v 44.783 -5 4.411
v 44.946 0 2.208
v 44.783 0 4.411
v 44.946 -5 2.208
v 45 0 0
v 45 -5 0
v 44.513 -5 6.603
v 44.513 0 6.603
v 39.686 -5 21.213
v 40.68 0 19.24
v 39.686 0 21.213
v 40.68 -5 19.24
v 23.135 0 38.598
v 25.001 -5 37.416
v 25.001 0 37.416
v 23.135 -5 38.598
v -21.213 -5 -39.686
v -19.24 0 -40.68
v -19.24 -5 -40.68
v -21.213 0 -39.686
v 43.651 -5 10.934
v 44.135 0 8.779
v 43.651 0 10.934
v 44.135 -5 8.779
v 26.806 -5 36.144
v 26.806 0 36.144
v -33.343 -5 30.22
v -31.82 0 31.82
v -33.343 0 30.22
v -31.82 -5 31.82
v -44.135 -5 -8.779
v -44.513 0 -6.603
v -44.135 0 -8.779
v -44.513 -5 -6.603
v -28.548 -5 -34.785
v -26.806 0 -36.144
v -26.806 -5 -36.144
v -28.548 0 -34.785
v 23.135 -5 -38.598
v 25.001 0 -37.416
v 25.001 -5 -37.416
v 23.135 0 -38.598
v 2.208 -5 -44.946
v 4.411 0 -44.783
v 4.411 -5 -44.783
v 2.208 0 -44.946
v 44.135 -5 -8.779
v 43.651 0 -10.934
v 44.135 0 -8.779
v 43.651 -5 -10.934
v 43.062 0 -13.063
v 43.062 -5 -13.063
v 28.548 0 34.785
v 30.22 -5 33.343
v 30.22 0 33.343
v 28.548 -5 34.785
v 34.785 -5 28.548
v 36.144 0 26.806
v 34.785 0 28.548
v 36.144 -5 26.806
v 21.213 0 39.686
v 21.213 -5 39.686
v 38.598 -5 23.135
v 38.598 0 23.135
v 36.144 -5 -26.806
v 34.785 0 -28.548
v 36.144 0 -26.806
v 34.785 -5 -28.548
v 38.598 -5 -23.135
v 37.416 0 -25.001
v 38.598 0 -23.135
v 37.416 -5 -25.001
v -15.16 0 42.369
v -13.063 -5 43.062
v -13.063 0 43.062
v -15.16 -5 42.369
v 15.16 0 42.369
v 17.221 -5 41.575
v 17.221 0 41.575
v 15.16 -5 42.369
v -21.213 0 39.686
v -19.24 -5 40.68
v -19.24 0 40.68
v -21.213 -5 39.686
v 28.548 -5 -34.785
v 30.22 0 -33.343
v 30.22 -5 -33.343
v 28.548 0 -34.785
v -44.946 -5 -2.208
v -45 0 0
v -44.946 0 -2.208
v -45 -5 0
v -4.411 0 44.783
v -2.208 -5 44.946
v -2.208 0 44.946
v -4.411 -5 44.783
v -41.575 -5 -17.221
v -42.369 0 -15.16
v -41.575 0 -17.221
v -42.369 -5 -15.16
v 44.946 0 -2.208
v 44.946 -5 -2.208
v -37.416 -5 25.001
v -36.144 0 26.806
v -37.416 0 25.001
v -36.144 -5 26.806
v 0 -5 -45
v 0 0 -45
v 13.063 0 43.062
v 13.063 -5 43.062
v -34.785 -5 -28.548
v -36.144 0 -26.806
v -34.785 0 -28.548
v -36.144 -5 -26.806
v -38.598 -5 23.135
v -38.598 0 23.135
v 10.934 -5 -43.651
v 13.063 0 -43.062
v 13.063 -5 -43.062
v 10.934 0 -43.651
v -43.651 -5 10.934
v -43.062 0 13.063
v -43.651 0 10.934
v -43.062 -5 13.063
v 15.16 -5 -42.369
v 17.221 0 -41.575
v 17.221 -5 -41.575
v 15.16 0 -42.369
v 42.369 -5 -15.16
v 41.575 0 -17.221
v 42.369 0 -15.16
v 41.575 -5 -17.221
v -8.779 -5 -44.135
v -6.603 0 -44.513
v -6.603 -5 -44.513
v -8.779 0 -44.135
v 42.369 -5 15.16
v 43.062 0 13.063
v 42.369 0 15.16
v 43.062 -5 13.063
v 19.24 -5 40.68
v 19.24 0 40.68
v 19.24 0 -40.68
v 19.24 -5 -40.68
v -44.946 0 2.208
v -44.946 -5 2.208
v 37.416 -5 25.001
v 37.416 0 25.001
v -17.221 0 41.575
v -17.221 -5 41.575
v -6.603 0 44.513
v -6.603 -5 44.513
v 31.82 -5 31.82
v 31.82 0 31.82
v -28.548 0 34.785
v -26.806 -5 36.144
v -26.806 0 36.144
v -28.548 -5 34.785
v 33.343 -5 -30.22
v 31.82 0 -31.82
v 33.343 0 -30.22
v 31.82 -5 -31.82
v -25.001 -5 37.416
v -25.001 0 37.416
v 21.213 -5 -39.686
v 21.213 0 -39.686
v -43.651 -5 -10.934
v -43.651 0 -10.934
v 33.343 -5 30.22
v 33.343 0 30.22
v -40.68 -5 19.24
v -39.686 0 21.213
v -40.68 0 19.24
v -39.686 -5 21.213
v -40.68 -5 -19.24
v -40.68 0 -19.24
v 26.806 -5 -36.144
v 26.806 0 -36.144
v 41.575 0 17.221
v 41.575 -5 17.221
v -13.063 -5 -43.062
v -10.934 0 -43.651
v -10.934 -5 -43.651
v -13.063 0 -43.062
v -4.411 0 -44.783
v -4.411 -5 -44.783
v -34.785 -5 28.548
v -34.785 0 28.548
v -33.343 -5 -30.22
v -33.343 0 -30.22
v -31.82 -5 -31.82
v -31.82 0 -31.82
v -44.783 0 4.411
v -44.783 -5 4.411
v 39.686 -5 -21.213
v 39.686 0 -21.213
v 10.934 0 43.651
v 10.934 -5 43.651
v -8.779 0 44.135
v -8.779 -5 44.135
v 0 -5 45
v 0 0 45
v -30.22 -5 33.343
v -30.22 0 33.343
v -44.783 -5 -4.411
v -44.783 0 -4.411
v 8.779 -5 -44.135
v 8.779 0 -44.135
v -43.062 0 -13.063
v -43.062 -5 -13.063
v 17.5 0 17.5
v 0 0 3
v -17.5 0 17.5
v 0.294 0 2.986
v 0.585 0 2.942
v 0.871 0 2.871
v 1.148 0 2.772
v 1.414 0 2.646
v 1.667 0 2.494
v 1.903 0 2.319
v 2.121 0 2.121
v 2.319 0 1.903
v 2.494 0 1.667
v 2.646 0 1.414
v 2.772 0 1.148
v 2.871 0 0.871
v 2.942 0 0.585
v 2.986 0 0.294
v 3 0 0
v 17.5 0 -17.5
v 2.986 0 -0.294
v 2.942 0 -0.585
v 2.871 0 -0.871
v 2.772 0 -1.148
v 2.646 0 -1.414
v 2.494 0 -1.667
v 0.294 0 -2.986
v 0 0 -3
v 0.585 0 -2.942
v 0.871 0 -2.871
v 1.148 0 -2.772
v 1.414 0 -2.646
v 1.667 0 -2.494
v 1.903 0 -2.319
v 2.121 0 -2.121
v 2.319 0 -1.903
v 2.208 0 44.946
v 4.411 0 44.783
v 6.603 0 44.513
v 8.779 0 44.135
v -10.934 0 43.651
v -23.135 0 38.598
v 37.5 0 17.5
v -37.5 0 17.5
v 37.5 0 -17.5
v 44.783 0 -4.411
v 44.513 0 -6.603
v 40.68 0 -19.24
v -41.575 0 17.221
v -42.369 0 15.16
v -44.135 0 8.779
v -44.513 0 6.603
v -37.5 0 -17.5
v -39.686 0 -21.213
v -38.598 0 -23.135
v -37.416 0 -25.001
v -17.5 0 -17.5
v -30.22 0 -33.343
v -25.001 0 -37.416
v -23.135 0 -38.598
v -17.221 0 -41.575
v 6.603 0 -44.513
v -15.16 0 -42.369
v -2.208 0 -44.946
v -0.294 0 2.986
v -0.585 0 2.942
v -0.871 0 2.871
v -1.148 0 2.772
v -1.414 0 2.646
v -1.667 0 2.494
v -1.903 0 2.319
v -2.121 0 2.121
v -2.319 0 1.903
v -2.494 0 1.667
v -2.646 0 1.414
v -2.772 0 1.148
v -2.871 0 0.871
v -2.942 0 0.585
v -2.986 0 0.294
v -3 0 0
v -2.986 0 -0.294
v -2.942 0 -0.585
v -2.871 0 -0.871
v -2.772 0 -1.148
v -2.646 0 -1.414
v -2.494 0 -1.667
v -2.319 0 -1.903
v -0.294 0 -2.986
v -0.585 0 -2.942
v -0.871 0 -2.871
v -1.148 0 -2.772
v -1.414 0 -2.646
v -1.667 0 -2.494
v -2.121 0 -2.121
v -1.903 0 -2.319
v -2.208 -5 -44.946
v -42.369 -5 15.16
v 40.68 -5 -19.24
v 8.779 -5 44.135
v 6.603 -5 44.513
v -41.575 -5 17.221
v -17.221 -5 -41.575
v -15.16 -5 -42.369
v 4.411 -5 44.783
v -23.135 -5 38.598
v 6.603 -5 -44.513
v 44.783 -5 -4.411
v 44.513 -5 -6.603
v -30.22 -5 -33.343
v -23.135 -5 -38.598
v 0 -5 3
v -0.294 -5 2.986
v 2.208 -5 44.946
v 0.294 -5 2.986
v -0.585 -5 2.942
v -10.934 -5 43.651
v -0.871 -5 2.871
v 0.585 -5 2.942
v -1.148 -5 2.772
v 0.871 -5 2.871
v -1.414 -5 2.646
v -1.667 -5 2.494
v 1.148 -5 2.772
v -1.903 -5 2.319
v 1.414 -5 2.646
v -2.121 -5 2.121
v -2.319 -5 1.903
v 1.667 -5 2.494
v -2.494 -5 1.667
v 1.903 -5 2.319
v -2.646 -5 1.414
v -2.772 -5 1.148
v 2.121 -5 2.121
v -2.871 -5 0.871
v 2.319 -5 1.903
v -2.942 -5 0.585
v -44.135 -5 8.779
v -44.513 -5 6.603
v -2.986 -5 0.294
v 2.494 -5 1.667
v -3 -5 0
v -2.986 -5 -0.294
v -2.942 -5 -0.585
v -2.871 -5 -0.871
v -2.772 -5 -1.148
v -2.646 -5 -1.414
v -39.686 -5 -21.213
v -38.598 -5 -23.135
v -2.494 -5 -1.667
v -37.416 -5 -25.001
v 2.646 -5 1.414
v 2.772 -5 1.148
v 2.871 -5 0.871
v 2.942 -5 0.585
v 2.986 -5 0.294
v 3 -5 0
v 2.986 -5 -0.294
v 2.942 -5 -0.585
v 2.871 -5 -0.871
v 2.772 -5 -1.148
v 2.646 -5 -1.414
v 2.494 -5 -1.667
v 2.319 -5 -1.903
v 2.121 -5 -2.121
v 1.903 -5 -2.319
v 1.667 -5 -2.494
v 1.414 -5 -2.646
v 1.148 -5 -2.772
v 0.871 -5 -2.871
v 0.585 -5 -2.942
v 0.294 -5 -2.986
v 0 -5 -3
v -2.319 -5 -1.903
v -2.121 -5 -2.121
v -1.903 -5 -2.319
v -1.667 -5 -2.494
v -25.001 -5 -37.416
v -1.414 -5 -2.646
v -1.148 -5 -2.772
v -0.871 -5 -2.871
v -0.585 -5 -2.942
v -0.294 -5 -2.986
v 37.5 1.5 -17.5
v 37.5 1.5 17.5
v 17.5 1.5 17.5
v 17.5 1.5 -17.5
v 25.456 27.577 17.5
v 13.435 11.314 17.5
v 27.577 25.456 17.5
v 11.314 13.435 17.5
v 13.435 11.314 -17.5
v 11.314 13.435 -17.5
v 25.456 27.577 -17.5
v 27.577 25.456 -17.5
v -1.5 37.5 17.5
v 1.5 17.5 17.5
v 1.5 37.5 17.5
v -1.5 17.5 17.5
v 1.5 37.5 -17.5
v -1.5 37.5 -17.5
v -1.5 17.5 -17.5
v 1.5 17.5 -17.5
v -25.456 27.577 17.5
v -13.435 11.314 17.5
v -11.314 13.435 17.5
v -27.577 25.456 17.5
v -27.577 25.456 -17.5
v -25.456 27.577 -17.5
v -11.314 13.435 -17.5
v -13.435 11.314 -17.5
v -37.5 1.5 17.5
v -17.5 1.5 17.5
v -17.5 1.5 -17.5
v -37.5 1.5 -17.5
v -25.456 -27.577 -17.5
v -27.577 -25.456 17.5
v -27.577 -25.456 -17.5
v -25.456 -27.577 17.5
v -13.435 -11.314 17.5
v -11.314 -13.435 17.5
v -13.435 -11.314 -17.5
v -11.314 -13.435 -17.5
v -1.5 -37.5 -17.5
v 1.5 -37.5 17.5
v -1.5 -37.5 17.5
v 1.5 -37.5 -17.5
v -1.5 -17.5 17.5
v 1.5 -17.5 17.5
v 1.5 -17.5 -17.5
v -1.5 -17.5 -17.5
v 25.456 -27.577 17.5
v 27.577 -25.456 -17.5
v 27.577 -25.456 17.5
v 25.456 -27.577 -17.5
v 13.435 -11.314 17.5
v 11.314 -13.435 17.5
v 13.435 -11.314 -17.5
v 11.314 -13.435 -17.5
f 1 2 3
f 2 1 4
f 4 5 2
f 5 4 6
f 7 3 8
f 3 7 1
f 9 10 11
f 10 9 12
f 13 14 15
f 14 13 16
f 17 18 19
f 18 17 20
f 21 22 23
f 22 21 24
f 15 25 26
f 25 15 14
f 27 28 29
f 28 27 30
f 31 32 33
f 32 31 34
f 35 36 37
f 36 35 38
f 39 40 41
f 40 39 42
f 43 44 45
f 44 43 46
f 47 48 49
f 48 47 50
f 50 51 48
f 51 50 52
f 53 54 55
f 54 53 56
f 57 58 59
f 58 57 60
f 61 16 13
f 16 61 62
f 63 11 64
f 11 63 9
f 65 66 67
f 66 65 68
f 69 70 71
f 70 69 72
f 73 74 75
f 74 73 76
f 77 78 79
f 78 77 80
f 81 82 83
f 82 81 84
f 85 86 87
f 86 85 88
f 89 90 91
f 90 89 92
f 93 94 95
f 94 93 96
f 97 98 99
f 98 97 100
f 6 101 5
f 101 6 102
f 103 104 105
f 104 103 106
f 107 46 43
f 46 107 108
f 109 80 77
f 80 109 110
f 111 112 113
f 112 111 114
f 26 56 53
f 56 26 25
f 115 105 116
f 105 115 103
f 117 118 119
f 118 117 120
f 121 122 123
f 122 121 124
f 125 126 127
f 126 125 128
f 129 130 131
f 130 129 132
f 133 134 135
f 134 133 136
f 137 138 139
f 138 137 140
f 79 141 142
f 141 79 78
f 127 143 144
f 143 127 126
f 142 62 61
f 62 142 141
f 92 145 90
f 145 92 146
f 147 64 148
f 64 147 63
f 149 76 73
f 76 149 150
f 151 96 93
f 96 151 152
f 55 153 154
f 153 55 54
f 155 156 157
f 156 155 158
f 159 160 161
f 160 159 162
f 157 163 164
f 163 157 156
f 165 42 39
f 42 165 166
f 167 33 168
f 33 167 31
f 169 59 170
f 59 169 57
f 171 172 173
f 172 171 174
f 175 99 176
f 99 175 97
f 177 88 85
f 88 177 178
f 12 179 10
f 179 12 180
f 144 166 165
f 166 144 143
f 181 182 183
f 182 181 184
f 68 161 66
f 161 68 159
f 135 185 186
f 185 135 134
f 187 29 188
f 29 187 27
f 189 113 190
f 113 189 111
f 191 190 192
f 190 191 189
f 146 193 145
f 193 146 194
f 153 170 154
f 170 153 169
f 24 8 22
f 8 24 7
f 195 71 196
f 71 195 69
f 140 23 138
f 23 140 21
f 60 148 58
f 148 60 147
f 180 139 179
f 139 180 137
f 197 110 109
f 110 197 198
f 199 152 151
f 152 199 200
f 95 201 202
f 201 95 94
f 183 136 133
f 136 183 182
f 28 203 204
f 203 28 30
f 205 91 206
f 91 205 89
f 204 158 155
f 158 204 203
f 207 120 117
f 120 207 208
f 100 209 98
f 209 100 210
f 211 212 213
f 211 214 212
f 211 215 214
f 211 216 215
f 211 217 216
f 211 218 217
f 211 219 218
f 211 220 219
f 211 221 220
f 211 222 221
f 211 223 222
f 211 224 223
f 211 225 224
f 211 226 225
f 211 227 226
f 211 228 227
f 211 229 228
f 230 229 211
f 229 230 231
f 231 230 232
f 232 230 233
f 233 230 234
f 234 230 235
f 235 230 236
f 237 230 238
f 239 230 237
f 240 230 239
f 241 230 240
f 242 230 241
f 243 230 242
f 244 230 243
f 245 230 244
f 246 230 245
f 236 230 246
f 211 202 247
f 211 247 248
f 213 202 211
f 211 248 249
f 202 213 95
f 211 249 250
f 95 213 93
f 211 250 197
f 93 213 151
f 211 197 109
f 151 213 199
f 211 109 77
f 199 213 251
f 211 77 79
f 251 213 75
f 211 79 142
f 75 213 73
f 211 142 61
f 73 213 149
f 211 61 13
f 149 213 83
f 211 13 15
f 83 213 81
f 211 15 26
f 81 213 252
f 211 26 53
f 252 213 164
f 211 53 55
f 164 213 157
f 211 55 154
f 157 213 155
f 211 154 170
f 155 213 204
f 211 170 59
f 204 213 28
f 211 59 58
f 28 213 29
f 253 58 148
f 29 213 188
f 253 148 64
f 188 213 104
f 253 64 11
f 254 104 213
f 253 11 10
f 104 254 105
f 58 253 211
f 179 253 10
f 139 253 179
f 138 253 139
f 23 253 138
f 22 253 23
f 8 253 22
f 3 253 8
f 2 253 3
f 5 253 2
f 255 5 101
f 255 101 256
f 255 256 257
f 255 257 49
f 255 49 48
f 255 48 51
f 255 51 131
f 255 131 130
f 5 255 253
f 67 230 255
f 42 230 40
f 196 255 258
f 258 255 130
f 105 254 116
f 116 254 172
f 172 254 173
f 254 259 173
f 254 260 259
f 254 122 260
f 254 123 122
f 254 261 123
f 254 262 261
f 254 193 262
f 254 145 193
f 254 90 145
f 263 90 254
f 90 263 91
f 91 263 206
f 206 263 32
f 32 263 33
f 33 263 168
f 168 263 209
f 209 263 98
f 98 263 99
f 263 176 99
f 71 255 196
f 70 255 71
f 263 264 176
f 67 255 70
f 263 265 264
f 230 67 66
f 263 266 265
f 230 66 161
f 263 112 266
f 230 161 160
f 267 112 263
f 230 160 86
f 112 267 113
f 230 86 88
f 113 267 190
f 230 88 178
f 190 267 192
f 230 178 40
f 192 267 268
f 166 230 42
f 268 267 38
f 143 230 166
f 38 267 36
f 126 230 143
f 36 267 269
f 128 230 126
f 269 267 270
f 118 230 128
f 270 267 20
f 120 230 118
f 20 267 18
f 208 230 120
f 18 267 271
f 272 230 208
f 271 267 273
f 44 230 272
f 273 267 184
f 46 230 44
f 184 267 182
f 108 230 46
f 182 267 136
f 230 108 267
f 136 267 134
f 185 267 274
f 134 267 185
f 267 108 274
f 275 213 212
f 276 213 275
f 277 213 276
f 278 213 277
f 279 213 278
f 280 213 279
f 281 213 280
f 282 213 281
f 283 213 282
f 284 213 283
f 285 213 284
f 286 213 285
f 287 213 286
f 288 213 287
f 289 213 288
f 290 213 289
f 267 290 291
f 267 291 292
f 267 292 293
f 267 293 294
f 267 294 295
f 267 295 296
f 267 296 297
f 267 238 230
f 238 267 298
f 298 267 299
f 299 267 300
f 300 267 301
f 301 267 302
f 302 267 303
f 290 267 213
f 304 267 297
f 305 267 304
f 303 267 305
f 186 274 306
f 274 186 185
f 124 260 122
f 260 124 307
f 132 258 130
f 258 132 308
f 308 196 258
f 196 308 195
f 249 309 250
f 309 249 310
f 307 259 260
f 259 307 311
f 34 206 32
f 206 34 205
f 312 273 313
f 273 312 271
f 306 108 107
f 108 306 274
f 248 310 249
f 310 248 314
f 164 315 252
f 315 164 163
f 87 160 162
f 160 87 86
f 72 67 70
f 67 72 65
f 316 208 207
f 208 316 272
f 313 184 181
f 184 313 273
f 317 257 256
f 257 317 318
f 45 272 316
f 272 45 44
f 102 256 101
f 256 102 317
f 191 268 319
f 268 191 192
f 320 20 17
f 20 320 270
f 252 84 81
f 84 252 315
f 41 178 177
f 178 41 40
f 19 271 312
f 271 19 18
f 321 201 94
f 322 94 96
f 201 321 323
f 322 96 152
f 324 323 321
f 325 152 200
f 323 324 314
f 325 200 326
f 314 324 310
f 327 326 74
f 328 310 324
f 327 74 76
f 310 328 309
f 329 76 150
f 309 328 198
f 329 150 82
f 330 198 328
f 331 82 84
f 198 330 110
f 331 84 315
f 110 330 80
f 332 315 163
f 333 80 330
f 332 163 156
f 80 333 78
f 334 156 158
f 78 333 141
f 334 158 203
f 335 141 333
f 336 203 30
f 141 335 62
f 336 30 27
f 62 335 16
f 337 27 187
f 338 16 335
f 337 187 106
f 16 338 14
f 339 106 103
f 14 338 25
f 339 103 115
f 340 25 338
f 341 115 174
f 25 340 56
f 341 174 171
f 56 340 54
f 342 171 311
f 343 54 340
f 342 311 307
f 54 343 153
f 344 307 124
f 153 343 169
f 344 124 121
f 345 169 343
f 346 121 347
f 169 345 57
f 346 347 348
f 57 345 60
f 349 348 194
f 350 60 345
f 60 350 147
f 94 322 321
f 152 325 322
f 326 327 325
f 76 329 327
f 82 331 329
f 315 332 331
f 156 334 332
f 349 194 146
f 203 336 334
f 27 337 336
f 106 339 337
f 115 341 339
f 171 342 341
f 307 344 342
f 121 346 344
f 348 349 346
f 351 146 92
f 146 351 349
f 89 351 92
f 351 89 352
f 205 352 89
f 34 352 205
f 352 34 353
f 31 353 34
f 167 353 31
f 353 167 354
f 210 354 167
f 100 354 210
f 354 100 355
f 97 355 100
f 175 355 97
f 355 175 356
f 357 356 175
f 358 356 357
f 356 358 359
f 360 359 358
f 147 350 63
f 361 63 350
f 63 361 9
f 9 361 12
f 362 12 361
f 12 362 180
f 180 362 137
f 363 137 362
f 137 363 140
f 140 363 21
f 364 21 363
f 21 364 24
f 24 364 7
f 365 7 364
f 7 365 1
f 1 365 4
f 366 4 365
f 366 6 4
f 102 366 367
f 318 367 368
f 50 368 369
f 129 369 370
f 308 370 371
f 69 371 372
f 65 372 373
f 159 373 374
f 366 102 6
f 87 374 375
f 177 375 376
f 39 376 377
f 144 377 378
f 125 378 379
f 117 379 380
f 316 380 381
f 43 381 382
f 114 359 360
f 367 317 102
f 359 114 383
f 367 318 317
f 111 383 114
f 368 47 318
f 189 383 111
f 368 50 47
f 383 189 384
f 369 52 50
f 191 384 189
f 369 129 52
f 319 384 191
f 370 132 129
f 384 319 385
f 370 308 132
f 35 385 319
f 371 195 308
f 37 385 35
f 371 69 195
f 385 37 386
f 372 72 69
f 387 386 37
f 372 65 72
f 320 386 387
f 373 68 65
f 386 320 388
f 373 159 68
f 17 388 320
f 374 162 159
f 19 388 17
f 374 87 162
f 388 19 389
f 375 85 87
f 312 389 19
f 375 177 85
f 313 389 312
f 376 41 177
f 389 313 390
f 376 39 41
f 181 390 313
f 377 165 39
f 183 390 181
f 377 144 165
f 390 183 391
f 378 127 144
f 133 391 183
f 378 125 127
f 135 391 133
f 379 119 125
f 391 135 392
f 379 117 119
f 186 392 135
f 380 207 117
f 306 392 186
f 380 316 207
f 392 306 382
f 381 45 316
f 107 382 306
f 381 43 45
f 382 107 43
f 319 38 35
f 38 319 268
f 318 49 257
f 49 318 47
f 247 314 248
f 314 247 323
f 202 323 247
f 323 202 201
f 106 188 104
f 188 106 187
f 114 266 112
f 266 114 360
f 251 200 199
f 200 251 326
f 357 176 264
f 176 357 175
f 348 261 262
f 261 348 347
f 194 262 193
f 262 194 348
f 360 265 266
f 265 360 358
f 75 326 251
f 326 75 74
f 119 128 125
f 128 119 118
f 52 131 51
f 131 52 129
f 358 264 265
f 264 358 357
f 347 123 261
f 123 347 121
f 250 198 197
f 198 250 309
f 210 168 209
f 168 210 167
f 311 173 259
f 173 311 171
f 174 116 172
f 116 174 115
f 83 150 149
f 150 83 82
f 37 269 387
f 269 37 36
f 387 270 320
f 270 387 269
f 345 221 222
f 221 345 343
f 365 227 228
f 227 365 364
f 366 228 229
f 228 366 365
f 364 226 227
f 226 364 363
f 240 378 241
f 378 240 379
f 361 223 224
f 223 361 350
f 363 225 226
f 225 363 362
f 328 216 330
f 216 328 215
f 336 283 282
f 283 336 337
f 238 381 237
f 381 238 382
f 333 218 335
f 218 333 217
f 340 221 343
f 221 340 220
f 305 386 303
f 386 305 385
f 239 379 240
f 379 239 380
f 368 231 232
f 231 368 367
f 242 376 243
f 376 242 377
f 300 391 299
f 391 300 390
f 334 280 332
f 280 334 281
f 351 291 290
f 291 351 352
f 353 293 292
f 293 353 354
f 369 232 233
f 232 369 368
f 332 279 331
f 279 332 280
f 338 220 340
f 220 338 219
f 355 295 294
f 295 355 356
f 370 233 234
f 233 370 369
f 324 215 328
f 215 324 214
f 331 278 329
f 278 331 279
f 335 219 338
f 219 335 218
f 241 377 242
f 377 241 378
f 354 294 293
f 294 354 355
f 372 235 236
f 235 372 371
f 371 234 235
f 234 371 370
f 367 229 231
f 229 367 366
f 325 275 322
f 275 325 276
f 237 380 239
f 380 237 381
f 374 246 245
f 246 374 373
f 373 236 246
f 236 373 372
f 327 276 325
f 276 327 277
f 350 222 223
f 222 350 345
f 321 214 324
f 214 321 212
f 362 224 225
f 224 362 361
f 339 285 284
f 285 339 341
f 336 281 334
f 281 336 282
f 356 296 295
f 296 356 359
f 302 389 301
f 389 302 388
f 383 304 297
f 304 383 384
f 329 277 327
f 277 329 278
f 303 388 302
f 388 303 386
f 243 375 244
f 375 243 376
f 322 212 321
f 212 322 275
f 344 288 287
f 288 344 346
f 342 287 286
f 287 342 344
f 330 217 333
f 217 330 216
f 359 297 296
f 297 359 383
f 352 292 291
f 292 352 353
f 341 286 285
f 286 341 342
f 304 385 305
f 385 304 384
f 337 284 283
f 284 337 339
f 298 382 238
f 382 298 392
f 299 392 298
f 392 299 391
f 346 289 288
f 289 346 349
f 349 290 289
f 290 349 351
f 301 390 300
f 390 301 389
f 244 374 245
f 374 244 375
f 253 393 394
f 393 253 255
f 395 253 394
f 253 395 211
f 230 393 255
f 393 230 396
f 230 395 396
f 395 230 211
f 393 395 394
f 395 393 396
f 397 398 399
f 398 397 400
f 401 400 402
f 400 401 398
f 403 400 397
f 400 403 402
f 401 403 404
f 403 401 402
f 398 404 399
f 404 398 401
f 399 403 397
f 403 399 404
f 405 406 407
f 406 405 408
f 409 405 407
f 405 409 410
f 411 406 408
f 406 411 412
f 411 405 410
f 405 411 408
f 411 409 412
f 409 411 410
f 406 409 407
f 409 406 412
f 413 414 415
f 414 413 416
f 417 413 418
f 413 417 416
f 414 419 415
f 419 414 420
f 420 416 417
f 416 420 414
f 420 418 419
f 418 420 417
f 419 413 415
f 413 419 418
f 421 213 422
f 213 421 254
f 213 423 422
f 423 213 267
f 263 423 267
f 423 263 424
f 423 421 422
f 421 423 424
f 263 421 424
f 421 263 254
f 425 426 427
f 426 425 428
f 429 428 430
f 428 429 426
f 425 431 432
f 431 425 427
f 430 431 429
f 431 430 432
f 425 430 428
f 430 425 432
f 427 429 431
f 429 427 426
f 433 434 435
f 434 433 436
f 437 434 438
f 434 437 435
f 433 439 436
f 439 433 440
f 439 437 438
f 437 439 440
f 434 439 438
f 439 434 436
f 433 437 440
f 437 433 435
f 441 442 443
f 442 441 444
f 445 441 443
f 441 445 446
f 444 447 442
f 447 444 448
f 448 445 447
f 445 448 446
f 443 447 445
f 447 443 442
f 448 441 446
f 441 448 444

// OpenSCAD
wheel_d=90; wheel_t=5; paddle_w=20; paddle_h=35; paddle_th=3; shaft_r=3;
module paddle(){ translate([wheel_d/2 - paddle_h/2,0,0]) cube([paddle_w,paddle_th,paddle_h],center=true); }
module wheel(){ rotate([90,0,0]) difference(){ cylinder(h=wheel_t,r=wheel_d/2,$fn=128); translate([0,0,-1]) cylinder(h=wheel_t+2,r=shaft_r,$fn=64); } }
union(){ wheel(); for(i=[0:7]) rotate([0,0,i*45]) paddle(); }
